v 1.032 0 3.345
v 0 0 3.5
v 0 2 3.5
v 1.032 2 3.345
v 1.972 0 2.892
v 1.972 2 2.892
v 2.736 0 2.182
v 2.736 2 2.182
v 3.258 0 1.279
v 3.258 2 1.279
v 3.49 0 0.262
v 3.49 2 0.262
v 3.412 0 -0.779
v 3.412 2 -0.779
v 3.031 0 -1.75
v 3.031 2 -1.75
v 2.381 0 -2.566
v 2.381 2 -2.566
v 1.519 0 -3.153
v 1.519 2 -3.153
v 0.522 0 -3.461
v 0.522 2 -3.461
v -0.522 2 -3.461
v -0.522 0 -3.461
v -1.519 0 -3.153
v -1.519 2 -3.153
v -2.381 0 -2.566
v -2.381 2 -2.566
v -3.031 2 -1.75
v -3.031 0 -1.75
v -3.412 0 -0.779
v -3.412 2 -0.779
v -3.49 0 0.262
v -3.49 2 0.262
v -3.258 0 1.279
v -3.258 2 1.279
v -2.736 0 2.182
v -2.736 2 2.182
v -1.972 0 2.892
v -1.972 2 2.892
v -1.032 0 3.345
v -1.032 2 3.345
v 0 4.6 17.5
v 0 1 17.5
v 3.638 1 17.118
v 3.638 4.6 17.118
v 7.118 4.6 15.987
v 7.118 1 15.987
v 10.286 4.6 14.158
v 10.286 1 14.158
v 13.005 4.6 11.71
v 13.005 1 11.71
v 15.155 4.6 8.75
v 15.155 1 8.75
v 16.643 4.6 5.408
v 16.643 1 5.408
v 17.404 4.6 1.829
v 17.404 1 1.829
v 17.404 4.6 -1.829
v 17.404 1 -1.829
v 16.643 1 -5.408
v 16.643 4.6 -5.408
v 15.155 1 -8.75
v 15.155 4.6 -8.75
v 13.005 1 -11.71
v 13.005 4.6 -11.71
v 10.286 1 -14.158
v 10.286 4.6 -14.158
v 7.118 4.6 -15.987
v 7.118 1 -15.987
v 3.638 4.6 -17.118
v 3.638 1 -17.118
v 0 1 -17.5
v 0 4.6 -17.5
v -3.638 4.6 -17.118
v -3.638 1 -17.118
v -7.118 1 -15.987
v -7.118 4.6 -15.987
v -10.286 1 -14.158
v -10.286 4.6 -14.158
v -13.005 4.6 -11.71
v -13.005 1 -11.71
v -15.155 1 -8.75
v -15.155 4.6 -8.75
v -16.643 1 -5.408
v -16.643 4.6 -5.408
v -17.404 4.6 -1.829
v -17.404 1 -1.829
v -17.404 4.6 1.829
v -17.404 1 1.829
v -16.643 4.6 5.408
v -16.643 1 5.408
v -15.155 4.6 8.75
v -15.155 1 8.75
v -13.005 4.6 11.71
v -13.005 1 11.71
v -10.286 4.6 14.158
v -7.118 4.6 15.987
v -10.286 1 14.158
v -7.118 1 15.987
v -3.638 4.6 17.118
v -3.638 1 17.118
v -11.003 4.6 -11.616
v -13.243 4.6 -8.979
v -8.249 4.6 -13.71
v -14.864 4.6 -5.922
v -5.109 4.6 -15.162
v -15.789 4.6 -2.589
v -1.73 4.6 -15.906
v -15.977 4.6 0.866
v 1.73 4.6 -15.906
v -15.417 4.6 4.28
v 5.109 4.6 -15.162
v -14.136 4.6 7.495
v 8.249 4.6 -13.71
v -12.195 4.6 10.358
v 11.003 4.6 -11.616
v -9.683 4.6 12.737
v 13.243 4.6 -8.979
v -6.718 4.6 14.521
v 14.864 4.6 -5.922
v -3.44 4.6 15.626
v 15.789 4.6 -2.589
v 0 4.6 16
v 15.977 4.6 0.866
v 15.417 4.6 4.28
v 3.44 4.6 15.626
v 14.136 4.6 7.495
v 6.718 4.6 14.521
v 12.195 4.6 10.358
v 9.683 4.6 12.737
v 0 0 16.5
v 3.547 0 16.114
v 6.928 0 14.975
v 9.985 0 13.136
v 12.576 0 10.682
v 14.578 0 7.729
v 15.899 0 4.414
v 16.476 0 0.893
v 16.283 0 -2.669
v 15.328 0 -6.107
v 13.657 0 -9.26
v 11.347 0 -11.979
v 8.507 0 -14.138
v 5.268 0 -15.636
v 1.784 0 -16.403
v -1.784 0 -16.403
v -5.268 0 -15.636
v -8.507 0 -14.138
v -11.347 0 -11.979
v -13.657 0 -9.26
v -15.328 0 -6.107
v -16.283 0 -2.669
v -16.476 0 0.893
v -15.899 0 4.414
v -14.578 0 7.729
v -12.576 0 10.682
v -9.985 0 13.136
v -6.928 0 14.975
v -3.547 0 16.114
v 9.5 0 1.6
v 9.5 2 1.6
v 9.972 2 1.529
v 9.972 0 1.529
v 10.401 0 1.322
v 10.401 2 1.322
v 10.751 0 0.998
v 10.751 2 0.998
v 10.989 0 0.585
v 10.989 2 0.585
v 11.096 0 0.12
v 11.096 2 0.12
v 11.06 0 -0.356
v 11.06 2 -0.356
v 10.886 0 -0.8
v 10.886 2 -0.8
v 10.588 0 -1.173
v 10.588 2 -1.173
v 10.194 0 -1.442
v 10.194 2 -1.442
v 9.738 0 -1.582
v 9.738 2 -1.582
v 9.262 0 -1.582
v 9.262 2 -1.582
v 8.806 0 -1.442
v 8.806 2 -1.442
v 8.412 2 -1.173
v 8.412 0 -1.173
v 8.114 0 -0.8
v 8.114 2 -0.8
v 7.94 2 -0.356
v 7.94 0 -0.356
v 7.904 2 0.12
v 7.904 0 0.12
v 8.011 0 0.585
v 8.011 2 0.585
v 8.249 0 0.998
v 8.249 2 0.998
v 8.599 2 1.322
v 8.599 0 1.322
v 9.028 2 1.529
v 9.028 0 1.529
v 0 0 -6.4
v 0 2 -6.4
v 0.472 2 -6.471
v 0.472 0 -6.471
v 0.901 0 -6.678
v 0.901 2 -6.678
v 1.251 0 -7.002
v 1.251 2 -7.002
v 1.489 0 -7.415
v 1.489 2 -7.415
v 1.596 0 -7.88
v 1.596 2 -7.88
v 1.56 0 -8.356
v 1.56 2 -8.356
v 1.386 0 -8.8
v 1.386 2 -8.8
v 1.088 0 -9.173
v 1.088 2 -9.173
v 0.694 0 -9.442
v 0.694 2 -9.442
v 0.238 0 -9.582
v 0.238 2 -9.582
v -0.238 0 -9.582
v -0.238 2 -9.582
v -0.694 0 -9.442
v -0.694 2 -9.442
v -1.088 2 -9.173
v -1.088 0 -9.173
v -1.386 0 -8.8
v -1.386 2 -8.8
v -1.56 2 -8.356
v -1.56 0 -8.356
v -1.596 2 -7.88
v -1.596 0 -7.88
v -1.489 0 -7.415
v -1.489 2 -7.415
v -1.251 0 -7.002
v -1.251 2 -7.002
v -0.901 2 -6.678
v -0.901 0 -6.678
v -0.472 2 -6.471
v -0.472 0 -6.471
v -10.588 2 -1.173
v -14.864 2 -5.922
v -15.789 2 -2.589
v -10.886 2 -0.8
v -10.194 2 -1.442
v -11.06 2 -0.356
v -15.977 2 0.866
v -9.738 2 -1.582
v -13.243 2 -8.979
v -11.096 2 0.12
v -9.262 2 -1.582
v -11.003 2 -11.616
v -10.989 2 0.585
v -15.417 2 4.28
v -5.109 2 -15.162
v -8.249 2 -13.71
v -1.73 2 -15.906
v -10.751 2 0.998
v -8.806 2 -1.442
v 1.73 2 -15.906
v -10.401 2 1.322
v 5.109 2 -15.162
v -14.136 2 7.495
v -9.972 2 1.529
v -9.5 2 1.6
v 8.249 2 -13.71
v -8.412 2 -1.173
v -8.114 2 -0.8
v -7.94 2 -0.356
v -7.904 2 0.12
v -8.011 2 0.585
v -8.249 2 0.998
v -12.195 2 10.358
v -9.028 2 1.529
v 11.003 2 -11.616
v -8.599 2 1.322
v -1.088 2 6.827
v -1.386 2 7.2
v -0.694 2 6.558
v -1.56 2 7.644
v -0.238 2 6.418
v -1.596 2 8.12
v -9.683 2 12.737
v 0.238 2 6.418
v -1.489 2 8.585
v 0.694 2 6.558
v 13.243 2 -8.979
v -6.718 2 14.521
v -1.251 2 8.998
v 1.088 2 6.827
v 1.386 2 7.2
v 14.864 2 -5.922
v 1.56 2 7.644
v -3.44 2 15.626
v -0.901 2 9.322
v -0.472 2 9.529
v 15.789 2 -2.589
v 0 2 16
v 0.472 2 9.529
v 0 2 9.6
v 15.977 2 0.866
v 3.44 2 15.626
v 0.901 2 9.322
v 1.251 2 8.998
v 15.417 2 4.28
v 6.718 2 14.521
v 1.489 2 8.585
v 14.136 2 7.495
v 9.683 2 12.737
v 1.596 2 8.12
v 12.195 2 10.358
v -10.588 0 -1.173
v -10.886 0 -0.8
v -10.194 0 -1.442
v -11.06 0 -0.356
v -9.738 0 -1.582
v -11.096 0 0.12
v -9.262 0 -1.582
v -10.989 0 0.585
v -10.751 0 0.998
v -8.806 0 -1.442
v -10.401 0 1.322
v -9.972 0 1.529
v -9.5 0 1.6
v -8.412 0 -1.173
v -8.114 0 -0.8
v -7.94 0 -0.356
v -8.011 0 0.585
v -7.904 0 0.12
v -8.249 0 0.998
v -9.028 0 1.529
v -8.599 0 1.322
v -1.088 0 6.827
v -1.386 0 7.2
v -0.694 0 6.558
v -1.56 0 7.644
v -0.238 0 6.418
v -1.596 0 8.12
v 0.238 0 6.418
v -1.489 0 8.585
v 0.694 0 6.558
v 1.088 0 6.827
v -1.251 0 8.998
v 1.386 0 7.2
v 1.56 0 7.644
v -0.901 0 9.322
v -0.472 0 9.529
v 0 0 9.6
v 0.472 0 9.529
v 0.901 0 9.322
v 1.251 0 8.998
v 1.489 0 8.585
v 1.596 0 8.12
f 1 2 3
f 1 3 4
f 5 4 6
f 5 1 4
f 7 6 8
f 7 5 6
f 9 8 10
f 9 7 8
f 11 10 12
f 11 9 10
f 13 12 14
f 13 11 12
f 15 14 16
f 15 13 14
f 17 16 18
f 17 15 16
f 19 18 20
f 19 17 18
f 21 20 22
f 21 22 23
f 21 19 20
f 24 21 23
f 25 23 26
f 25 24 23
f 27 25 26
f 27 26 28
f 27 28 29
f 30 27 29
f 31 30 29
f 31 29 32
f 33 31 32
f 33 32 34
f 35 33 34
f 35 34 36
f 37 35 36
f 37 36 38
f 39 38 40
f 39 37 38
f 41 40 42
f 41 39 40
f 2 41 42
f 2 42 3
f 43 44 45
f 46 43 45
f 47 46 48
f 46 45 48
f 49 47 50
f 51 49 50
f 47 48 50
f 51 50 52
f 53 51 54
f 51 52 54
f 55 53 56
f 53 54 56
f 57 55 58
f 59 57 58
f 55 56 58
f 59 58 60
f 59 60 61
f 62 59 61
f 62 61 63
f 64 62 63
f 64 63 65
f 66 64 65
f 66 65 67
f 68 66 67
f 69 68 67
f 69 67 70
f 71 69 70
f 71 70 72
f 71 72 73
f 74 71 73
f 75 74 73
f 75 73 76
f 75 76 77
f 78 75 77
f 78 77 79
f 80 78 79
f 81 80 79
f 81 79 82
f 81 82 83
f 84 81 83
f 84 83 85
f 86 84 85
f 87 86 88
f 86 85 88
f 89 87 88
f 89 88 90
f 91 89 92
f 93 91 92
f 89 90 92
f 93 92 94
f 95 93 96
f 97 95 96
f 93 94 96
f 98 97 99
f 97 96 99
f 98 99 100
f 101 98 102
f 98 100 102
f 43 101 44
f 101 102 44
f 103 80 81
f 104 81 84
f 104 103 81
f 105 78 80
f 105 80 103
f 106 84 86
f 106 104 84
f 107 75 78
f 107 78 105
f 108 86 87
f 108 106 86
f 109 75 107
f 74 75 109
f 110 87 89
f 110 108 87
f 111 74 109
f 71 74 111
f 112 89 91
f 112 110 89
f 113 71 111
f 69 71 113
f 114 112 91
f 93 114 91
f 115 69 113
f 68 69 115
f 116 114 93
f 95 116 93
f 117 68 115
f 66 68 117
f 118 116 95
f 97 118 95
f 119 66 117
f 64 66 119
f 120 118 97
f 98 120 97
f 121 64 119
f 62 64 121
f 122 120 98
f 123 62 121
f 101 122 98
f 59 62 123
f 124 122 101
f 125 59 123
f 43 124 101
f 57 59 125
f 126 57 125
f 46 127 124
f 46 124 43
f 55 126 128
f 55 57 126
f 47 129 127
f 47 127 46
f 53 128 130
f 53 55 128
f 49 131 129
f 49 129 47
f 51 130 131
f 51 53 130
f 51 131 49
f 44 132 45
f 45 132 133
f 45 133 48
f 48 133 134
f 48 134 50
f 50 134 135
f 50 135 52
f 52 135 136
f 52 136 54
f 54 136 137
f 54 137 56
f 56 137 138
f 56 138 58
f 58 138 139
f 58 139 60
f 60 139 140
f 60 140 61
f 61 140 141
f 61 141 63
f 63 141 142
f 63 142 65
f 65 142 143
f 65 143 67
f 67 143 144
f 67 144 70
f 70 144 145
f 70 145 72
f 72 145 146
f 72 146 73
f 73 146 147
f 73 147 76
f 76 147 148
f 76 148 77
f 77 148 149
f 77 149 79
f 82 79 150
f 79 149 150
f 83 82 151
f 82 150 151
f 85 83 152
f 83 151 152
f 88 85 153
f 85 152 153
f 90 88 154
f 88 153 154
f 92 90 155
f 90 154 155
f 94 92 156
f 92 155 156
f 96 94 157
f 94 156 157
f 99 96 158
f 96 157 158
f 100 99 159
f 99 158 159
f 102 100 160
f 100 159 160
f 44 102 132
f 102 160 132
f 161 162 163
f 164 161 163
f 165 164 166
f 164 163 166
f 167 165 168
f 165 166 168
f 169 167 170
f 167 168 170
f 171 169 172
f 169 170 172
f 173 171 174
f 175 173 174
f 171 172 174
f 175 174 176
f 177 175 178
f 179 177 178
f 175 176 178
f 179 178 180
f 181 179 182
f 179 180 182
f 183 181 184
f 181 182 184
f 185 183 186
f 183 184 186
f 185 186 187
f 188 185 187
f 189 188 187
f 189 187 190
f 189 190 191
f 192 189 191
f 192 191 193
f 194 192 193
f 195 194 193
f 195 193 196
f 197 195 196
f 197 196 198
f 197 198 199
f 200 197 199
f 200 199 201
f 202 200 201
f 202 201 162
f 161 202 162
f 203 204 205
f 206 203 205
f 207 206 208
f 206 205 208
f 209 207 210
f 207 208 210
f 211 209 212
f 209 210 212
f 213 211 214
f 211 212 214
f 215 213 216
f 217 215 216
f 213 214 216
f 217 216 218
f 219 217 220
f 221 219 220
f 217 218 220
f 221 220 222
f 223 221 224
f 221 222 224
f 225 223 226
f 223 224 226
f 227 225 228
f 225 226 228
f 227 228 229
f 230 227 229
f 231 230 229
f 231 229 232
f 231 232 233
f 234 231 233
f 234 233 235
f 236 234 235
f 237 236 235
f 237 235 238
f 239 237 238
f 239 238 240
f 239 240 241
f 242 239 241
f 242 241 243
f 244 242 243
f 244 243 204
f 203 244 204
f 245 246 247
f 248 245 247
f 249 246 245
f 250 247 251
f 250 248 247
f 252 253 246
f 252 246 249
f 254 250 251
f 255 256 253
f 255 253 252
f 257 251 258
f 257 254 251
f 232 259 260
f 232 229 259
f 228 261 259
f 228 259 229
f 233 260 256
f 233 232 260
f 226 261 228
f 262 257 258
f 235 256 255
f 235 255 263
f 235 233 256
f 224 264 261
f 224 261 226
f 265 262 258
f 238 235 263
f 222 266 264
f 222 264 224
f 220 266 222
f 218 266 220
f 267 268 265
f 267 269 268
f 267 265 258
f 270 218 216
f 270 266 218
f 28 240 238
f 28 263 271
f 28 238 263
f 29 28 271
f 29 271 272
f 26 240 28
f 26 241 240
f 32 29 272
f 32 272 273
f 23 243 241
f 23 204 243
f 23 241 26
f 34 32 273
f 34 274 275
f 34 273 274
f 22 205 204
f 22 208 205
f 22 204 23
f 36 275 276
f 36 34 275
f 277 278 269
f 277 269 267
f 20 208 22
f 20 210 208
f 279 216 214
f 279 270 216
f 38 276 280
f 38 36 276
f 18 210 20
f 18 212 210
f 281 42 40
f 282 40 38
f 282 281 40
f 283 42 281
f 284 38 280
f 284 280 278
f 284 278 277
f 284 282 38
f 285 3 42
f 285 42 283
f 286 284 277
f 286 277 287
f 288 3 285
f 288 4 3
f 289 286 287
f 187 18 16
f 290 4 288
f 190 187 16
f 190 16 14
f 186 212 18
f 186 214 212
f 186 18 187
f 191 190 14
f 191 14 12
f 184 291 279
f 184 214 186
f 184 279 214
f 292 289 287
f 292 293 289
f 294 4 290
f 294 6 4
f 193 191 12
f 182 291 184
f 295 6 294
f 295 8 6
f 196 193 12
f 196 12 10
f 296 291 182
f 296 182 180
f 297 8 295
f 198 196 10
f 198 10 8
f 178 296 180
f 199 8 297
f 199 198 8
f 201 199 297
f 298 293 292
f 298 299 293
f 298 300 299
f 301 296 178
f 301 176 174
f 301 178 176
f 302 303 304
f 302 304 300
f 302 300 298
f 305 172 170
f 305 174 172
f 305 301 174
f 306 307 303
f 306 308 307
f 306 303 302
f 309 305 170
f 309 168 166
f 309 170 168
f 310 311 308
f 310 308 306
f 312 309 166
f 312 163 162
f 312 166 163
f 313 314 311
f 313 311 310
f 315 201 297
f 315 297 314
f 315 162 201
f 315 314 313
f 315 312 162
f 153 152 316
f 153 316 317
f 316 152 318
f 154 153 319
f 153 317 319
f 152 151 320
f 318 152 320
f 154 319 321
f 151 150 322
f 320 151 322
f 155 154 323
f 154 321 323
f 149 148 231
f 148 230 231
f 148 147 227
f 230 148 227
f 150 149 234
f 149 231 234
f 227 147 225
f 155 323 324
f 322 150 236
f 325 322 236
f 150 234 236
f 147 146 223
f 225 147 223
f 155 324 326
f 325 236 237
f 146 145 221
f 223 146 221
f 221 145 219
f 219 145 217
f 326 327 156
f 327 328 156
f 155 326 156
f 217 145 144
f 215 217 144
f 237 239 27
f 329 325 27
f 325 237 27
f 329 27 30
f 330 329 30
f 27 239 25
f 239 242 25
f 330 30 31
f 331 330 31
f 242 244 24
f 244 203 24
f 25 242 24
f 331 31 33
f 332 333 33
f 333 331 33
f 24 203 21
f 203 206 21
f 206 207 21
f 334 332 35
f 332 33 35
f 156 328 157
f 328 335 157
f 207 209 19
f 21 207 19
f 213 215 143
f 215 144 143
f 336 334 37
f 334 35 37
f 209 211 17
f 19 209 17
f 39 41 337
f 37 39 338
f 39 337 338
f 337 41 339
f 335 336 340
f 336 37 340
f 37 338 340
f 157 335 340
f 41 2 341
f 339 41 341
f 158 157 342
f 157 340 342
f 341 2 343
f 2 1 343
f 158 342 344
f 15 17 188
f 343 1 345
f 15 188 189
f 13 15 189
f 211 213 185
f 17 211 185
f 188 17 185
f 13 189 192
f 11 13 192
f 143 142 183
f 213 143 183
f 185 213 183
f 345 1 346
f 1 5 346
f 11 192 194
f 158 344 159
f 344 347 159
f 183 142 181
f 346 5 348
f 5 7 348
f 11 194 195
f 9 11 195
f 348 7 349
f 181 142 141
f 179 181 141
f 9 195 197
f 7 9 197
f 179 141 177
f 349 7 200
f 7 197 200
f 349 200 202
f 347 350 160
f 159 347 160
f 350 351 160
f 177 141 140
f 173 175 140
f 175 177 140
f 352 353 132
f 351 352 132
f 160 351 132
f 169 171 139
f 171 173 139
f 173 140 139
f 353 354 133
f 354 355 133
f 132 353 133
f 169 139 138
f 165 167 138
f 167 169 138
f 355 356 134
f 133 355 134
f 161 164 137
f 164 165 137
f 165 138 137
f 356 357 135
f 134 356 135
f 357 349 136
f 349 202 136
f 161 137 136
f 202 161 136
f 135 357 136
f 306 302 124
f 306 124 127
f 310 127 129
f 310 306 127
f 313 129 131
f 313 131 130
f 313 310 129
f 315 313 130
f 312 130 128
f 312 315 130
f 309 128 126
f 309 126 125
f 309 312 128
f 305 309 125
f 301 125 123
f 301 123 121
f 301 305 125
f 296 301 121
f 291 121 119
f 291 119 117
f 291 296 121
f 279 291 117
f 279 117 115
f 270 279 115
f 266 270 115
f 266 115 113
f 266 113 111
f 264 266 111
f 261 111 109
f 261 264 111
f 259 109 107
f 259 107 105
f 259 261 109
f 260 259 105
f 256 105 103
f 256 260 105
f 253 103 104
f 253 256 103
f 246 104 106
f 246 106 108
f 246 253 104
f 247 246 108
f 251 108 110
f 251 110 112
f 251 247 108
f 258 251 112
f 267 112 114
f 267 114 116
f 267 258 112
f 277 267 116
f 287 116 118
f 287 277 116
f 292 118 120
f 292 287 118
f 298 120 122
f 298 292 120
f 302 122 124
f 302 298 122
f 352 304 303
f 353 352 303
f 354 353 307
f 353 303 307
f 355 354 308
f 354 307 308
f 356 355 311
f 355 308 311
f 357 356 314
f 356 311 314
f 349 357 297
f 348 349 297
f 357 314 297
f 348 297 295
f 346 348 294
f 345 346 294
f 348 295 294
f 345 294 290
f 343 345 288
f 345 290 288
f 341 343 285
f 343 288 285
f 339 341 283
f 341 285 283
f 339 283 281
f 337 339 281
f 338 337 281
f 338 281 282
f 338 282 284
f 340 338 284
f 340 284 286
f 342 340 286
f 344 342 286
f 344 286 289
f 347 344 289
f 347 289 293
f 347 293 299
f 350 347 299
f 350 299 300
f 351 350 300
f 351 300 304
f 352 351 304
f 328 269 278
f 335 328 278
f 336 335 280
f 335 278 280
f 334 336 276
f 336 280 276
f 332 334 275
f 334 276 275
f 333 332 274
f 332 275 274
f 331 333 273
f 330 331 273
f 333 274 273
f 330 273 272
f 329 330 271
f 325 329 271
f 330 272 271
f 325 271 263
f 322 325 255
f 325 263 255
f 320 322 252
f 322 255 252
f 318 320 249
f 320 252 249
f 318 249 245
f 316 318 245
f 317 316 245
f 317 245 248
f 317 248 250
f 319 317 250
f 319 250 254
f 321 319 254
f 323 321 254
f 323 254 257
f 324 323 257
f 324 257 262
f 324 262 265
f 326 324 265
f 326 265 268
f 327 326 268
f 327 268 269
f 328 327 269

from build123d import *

# Parameters (mm, degrees)
SKETCH1_R           = 17.5
SKETCH1_R_2         = 3.5
BOSS_EXTRUDE1_DEPTH = 2
SKETCH10_R          = 17.5
SKETCH10_R_2        = 16
BOSS_EXTRUDE4_DEPTH = 2.6
SKETCH2_R           = 1.6
CUT_EXTRUDE1_DEPTH  = 3
CHAMFER2_SIZE       = 1


with BuildPart() as part:
    # Sketch1 → Boss-Extrude1 (new body)
    with BuildSketch(Plane(origin=(0, 0, 0), x_dir=(1, 0, 0), z_dir=(0, 1, 0))):
        with Locations(Location((0, 0, 0), (0, 0, 270))):
            Circle(SKETCH1_R)
        with Locations(Location((0, 0, 0), (0, 0, 270))):
            Circle(SKETCH1_R_2, mode=Mode.SUBTRACT)
    extrude(amount=BOSS_EXTRUDE1_DEPTH)

    # Sketch10 → Boss-Extrude4 (add)
    with BuildSketch(Plane(origin=(0, 2, 0), x_dir=(1, 0, 0), z_dir=(0, 1, 0))):
        with Locations(Location((0, 0, 0), (0, 0, 270))):
            Circle(SKETCH10_R)
        with Locations(Location((0, 0, 0), (0, 0, 270))):
            Circle(SKETCH10_R_2, mode=Mode.SUBTRACT)
    extrude(amount=BOSS_EXTRUDE4_DEPTH)

    # Sketch2 → Cut-Extrude1 (cut)
    with BuildSketch(Plane(origin=(0, 2, 0), x_dir=(1, 0, 0), z_dir=(0, 1, 0))):
        with Locations(Location((-9.5, 0, 0), (0, 0, 270))):
            Circle(SKETCH2_R)
        with Locations(Location((0, 8, 0), (0, 0, 270))):
            Circle(SKETCH2_R)
        with Locations(Location((0, -8, 0), (0, 0, 270))):
            Circle(SKETCH2_R)
        with Locations(Location((9.5, 0, 0), (0, 0, 270))):
            Circle(SKETCH2_R)
    extrude(amount=-CUT_EXTRUDE1_DEPTH, mode=Mode.SUBTRACT)

    # Chamfer2
    chamfer2_edges = [part.edges().sort_by_distance(p)[0] for p in [
        (0, 0, -17.5),
    ]]
    chamfer(chamfer2_edges, length=CHAMFER2_SIZE)


solid = part.part
